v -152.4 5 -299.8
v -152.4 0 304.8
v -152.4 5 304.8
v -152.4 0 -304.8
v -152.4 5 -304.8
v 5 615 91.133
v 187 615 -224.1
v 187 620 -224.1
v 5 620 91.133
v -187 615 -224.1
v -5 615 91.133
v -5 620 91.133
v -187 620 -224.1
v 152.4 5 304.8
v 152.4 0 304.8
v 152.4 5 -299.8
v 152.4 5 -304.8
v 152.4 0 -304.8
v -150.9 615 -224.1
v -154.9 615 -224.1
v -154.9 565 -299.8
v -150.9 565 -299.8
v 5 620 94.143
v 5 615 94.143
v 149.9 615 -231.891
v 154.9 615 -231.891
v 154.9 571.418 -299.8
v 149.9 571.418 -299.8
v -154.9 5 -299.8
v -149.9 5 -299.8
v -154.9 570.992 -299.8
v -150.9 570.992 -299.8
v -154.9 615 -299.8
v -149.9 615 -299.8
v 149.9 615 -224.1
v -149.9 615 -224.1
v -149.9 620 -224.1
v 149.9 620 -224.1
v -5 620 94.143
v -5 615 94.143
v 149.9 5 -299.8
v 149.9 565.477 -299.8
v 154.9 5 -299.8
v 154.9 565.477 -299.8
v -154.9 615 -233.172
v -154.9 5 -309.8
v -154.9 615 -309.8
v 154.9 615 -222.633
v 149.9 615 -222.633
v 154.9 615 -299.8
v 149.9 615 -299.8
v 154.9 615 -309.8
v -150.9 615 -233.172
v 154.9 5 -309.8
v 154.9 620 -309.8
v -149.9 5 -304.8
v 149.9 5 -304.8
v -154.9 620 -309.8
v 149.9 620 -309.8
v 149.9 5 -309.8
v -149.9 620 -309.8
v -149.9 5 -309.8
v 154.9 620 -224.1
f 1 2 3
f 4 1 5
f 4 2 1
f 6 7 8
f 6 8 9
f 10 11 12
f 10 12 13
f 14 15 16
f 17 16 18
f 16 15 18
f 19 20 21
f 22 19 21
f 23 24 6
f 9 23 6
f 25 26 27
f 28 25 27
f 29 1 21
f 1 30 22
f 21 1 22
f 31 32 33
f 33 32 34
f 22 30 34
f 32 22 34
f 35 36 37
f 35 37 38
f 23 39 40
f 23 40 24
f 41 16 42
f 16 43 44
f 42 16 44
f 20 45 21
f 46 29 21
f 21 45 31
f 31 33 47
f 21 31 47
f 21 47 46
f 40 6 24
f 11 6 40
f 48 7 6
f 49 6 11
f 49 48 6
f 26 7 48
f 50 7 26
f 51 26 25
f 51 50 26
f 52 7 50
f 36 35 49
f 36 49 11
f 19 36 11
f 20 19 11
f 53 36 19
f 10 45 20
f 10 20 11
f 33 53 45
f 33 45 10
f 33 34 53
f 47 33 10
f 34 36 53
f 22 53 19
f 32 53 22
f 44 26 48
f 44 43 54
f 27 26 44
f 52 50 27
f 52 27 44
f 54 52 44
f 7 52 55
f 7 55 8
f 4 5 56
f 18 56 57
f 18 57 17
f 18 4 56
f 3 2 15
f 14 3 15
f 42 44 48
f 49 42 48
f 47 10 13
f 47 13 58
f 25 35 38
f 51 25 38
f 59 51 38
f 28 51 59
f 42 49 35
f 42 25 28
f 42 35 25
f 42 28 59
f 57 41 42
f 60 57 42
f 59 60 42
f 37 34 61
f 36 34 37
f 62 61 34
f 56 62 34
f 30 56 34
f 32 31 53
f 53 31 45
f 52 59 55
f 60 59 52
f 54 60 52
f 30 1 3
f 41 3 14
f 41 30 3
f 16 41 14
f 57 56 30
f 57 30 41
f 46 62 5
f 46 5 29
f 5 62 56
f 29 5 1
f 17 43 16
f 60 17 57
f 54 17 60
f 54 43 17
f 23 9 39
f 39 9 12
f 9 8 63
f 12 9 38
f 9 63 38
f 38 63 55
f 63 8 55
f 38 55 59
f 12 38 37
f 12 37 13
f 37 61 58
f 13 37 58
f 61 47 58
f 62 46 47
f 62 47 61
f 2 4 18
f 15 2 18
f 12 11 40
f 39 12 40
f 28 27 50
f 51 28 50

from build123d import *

# Parameters (mm, degrees)
SKETCH2_W           = 304.8
SKETCH2_H           = 609.6
BOSS_EXTRUDE1_DEPTH = 5
SKETCH3_W           = 10
SKETCH3_H           = 610
EXTRUDE_THIN1_DEPTH = 2.5
SKETCH4_W           = 10
SKETCH4_H           = 610
EXTRUDE_THIN2_DEPTH = 2.5
BOSS_EXTRUDE2_DEPTH = 5
EXTRUDE_THIN3_DEPTH = 4
EXTRUDE_THIN5_DEPTH = 5
SKETCH12_W          = 309.8
SKETCH12_H          = 215.656941329
CUT_EXTRUDE1_DEPTH  = 615


with BuildPart() as part:
    # Sketch2 → Boss-Extrude1 (new body)
    with BuildSketch(Plane(origin=(0, 0, 0), x_dir=(1, 0, 0), z_dir=(0, 1, 0))):
        Rectangle(SKETCH2_W, SKETCH2_H)
    extrude(amount=BOSS_EXTRUDE1_DEPTH)

    # Sketch3 → Extrude-Thin1 (add, symmetric)
    with BuildSketch(Plane(origin=(152.4, 0, 0), x_dir=(0, 0, -1), z_dir=(1, 0, 0))):
        with Locations((-304.8, 310)):
            Rectangle(SKETCH3_W, SKETCH3_H)
        with Locations((304.8, 310)):
            Rectangle(SKETCH3_W, SKETCH3_H)
    extrude(amount=EXTRUDE_THIN1_DEPTH, both=True)

    # Sketch4 → Extrude-Thin2 (add, symmetric)
    with BuildSketch(Plane.ZY.offset(152.4)):
        with Locations((-304.8, 310)):
            Rectangle(SKETCH4_W, SKETCH4_H)
        with Locations((304.8, 310)):
            Rectangle(SKETCH4_W, SKETCH4_H)
    extrude(amount=EXTRUDE_THIN2_DEPTH, both=True)

    # Sketch5 → Boss-Extrude2 (add)
    with BuildSketch(Plane(origin=(0, 615, 0), x_dir=(1, 0, 0), z_dir=(0, 1, 0))):
        Polygon((154.9, -309.8), (-154.9, -309.8), (-154.9, -299.8), (-5, -299.8), (-5, -99.8), (-5, -91.133474836), (-187, 224.099772141), (-154.9, 309.8), (-149.9, 309.8), (-149.9, 224.099772141), (149.9, 224.099772141), (149.9, 309.8), (154.9, 309.8), (187, 224.099772141), (5, -91.133474836), (5, -104.787457748), (5, -299.8), (154.9, -299.8), align=None)
    extrude(amount=BOSS_EXTRUDE2_DEPTH)

    # Sketch6 → Extrude-Thin3 (add)
    with BuildSketch(Plane.ZY.offset(154.9)):
        Polygon((-224.099772141, 615), (-299.8, 565), (-302.555663937, 569.172087759), (-226.855436078, 619.172087759), align=None)
    extrude(amount=-EXTRUDE_THIN3_DEPTH)

    # Sketch11 → Extrude-Thin5 (add)
    with BuildSketch(Plane(origin=(154.9, 0, 0), x_dir=(0, 0, -1), z_dir=(1, 0, 0))):
        Polygon((224.099772141, 620), (309.8, 565), (307.099444062, 560.792031651), (221.399216204, 615.792031651), align=None)
    extrude(amount=-EXTRUDE_THIN5_DEPTH)

    # Sketch12 → Cut-Extrude1 (cut)
    with BuildSketch(Plane(origin=(0, 620, 0), x_dir=(1, 0, 0), z_dir=(0, 1, 0))):
        with Locations((0, -201.971529336)):
            Rectangle(SKETCH12_W, SKETCH12_H)
    extrude(amount=-CUT_EXTRUDE1_DEPTH, mode=Mode.SUBTRACT)


solid = part.part
